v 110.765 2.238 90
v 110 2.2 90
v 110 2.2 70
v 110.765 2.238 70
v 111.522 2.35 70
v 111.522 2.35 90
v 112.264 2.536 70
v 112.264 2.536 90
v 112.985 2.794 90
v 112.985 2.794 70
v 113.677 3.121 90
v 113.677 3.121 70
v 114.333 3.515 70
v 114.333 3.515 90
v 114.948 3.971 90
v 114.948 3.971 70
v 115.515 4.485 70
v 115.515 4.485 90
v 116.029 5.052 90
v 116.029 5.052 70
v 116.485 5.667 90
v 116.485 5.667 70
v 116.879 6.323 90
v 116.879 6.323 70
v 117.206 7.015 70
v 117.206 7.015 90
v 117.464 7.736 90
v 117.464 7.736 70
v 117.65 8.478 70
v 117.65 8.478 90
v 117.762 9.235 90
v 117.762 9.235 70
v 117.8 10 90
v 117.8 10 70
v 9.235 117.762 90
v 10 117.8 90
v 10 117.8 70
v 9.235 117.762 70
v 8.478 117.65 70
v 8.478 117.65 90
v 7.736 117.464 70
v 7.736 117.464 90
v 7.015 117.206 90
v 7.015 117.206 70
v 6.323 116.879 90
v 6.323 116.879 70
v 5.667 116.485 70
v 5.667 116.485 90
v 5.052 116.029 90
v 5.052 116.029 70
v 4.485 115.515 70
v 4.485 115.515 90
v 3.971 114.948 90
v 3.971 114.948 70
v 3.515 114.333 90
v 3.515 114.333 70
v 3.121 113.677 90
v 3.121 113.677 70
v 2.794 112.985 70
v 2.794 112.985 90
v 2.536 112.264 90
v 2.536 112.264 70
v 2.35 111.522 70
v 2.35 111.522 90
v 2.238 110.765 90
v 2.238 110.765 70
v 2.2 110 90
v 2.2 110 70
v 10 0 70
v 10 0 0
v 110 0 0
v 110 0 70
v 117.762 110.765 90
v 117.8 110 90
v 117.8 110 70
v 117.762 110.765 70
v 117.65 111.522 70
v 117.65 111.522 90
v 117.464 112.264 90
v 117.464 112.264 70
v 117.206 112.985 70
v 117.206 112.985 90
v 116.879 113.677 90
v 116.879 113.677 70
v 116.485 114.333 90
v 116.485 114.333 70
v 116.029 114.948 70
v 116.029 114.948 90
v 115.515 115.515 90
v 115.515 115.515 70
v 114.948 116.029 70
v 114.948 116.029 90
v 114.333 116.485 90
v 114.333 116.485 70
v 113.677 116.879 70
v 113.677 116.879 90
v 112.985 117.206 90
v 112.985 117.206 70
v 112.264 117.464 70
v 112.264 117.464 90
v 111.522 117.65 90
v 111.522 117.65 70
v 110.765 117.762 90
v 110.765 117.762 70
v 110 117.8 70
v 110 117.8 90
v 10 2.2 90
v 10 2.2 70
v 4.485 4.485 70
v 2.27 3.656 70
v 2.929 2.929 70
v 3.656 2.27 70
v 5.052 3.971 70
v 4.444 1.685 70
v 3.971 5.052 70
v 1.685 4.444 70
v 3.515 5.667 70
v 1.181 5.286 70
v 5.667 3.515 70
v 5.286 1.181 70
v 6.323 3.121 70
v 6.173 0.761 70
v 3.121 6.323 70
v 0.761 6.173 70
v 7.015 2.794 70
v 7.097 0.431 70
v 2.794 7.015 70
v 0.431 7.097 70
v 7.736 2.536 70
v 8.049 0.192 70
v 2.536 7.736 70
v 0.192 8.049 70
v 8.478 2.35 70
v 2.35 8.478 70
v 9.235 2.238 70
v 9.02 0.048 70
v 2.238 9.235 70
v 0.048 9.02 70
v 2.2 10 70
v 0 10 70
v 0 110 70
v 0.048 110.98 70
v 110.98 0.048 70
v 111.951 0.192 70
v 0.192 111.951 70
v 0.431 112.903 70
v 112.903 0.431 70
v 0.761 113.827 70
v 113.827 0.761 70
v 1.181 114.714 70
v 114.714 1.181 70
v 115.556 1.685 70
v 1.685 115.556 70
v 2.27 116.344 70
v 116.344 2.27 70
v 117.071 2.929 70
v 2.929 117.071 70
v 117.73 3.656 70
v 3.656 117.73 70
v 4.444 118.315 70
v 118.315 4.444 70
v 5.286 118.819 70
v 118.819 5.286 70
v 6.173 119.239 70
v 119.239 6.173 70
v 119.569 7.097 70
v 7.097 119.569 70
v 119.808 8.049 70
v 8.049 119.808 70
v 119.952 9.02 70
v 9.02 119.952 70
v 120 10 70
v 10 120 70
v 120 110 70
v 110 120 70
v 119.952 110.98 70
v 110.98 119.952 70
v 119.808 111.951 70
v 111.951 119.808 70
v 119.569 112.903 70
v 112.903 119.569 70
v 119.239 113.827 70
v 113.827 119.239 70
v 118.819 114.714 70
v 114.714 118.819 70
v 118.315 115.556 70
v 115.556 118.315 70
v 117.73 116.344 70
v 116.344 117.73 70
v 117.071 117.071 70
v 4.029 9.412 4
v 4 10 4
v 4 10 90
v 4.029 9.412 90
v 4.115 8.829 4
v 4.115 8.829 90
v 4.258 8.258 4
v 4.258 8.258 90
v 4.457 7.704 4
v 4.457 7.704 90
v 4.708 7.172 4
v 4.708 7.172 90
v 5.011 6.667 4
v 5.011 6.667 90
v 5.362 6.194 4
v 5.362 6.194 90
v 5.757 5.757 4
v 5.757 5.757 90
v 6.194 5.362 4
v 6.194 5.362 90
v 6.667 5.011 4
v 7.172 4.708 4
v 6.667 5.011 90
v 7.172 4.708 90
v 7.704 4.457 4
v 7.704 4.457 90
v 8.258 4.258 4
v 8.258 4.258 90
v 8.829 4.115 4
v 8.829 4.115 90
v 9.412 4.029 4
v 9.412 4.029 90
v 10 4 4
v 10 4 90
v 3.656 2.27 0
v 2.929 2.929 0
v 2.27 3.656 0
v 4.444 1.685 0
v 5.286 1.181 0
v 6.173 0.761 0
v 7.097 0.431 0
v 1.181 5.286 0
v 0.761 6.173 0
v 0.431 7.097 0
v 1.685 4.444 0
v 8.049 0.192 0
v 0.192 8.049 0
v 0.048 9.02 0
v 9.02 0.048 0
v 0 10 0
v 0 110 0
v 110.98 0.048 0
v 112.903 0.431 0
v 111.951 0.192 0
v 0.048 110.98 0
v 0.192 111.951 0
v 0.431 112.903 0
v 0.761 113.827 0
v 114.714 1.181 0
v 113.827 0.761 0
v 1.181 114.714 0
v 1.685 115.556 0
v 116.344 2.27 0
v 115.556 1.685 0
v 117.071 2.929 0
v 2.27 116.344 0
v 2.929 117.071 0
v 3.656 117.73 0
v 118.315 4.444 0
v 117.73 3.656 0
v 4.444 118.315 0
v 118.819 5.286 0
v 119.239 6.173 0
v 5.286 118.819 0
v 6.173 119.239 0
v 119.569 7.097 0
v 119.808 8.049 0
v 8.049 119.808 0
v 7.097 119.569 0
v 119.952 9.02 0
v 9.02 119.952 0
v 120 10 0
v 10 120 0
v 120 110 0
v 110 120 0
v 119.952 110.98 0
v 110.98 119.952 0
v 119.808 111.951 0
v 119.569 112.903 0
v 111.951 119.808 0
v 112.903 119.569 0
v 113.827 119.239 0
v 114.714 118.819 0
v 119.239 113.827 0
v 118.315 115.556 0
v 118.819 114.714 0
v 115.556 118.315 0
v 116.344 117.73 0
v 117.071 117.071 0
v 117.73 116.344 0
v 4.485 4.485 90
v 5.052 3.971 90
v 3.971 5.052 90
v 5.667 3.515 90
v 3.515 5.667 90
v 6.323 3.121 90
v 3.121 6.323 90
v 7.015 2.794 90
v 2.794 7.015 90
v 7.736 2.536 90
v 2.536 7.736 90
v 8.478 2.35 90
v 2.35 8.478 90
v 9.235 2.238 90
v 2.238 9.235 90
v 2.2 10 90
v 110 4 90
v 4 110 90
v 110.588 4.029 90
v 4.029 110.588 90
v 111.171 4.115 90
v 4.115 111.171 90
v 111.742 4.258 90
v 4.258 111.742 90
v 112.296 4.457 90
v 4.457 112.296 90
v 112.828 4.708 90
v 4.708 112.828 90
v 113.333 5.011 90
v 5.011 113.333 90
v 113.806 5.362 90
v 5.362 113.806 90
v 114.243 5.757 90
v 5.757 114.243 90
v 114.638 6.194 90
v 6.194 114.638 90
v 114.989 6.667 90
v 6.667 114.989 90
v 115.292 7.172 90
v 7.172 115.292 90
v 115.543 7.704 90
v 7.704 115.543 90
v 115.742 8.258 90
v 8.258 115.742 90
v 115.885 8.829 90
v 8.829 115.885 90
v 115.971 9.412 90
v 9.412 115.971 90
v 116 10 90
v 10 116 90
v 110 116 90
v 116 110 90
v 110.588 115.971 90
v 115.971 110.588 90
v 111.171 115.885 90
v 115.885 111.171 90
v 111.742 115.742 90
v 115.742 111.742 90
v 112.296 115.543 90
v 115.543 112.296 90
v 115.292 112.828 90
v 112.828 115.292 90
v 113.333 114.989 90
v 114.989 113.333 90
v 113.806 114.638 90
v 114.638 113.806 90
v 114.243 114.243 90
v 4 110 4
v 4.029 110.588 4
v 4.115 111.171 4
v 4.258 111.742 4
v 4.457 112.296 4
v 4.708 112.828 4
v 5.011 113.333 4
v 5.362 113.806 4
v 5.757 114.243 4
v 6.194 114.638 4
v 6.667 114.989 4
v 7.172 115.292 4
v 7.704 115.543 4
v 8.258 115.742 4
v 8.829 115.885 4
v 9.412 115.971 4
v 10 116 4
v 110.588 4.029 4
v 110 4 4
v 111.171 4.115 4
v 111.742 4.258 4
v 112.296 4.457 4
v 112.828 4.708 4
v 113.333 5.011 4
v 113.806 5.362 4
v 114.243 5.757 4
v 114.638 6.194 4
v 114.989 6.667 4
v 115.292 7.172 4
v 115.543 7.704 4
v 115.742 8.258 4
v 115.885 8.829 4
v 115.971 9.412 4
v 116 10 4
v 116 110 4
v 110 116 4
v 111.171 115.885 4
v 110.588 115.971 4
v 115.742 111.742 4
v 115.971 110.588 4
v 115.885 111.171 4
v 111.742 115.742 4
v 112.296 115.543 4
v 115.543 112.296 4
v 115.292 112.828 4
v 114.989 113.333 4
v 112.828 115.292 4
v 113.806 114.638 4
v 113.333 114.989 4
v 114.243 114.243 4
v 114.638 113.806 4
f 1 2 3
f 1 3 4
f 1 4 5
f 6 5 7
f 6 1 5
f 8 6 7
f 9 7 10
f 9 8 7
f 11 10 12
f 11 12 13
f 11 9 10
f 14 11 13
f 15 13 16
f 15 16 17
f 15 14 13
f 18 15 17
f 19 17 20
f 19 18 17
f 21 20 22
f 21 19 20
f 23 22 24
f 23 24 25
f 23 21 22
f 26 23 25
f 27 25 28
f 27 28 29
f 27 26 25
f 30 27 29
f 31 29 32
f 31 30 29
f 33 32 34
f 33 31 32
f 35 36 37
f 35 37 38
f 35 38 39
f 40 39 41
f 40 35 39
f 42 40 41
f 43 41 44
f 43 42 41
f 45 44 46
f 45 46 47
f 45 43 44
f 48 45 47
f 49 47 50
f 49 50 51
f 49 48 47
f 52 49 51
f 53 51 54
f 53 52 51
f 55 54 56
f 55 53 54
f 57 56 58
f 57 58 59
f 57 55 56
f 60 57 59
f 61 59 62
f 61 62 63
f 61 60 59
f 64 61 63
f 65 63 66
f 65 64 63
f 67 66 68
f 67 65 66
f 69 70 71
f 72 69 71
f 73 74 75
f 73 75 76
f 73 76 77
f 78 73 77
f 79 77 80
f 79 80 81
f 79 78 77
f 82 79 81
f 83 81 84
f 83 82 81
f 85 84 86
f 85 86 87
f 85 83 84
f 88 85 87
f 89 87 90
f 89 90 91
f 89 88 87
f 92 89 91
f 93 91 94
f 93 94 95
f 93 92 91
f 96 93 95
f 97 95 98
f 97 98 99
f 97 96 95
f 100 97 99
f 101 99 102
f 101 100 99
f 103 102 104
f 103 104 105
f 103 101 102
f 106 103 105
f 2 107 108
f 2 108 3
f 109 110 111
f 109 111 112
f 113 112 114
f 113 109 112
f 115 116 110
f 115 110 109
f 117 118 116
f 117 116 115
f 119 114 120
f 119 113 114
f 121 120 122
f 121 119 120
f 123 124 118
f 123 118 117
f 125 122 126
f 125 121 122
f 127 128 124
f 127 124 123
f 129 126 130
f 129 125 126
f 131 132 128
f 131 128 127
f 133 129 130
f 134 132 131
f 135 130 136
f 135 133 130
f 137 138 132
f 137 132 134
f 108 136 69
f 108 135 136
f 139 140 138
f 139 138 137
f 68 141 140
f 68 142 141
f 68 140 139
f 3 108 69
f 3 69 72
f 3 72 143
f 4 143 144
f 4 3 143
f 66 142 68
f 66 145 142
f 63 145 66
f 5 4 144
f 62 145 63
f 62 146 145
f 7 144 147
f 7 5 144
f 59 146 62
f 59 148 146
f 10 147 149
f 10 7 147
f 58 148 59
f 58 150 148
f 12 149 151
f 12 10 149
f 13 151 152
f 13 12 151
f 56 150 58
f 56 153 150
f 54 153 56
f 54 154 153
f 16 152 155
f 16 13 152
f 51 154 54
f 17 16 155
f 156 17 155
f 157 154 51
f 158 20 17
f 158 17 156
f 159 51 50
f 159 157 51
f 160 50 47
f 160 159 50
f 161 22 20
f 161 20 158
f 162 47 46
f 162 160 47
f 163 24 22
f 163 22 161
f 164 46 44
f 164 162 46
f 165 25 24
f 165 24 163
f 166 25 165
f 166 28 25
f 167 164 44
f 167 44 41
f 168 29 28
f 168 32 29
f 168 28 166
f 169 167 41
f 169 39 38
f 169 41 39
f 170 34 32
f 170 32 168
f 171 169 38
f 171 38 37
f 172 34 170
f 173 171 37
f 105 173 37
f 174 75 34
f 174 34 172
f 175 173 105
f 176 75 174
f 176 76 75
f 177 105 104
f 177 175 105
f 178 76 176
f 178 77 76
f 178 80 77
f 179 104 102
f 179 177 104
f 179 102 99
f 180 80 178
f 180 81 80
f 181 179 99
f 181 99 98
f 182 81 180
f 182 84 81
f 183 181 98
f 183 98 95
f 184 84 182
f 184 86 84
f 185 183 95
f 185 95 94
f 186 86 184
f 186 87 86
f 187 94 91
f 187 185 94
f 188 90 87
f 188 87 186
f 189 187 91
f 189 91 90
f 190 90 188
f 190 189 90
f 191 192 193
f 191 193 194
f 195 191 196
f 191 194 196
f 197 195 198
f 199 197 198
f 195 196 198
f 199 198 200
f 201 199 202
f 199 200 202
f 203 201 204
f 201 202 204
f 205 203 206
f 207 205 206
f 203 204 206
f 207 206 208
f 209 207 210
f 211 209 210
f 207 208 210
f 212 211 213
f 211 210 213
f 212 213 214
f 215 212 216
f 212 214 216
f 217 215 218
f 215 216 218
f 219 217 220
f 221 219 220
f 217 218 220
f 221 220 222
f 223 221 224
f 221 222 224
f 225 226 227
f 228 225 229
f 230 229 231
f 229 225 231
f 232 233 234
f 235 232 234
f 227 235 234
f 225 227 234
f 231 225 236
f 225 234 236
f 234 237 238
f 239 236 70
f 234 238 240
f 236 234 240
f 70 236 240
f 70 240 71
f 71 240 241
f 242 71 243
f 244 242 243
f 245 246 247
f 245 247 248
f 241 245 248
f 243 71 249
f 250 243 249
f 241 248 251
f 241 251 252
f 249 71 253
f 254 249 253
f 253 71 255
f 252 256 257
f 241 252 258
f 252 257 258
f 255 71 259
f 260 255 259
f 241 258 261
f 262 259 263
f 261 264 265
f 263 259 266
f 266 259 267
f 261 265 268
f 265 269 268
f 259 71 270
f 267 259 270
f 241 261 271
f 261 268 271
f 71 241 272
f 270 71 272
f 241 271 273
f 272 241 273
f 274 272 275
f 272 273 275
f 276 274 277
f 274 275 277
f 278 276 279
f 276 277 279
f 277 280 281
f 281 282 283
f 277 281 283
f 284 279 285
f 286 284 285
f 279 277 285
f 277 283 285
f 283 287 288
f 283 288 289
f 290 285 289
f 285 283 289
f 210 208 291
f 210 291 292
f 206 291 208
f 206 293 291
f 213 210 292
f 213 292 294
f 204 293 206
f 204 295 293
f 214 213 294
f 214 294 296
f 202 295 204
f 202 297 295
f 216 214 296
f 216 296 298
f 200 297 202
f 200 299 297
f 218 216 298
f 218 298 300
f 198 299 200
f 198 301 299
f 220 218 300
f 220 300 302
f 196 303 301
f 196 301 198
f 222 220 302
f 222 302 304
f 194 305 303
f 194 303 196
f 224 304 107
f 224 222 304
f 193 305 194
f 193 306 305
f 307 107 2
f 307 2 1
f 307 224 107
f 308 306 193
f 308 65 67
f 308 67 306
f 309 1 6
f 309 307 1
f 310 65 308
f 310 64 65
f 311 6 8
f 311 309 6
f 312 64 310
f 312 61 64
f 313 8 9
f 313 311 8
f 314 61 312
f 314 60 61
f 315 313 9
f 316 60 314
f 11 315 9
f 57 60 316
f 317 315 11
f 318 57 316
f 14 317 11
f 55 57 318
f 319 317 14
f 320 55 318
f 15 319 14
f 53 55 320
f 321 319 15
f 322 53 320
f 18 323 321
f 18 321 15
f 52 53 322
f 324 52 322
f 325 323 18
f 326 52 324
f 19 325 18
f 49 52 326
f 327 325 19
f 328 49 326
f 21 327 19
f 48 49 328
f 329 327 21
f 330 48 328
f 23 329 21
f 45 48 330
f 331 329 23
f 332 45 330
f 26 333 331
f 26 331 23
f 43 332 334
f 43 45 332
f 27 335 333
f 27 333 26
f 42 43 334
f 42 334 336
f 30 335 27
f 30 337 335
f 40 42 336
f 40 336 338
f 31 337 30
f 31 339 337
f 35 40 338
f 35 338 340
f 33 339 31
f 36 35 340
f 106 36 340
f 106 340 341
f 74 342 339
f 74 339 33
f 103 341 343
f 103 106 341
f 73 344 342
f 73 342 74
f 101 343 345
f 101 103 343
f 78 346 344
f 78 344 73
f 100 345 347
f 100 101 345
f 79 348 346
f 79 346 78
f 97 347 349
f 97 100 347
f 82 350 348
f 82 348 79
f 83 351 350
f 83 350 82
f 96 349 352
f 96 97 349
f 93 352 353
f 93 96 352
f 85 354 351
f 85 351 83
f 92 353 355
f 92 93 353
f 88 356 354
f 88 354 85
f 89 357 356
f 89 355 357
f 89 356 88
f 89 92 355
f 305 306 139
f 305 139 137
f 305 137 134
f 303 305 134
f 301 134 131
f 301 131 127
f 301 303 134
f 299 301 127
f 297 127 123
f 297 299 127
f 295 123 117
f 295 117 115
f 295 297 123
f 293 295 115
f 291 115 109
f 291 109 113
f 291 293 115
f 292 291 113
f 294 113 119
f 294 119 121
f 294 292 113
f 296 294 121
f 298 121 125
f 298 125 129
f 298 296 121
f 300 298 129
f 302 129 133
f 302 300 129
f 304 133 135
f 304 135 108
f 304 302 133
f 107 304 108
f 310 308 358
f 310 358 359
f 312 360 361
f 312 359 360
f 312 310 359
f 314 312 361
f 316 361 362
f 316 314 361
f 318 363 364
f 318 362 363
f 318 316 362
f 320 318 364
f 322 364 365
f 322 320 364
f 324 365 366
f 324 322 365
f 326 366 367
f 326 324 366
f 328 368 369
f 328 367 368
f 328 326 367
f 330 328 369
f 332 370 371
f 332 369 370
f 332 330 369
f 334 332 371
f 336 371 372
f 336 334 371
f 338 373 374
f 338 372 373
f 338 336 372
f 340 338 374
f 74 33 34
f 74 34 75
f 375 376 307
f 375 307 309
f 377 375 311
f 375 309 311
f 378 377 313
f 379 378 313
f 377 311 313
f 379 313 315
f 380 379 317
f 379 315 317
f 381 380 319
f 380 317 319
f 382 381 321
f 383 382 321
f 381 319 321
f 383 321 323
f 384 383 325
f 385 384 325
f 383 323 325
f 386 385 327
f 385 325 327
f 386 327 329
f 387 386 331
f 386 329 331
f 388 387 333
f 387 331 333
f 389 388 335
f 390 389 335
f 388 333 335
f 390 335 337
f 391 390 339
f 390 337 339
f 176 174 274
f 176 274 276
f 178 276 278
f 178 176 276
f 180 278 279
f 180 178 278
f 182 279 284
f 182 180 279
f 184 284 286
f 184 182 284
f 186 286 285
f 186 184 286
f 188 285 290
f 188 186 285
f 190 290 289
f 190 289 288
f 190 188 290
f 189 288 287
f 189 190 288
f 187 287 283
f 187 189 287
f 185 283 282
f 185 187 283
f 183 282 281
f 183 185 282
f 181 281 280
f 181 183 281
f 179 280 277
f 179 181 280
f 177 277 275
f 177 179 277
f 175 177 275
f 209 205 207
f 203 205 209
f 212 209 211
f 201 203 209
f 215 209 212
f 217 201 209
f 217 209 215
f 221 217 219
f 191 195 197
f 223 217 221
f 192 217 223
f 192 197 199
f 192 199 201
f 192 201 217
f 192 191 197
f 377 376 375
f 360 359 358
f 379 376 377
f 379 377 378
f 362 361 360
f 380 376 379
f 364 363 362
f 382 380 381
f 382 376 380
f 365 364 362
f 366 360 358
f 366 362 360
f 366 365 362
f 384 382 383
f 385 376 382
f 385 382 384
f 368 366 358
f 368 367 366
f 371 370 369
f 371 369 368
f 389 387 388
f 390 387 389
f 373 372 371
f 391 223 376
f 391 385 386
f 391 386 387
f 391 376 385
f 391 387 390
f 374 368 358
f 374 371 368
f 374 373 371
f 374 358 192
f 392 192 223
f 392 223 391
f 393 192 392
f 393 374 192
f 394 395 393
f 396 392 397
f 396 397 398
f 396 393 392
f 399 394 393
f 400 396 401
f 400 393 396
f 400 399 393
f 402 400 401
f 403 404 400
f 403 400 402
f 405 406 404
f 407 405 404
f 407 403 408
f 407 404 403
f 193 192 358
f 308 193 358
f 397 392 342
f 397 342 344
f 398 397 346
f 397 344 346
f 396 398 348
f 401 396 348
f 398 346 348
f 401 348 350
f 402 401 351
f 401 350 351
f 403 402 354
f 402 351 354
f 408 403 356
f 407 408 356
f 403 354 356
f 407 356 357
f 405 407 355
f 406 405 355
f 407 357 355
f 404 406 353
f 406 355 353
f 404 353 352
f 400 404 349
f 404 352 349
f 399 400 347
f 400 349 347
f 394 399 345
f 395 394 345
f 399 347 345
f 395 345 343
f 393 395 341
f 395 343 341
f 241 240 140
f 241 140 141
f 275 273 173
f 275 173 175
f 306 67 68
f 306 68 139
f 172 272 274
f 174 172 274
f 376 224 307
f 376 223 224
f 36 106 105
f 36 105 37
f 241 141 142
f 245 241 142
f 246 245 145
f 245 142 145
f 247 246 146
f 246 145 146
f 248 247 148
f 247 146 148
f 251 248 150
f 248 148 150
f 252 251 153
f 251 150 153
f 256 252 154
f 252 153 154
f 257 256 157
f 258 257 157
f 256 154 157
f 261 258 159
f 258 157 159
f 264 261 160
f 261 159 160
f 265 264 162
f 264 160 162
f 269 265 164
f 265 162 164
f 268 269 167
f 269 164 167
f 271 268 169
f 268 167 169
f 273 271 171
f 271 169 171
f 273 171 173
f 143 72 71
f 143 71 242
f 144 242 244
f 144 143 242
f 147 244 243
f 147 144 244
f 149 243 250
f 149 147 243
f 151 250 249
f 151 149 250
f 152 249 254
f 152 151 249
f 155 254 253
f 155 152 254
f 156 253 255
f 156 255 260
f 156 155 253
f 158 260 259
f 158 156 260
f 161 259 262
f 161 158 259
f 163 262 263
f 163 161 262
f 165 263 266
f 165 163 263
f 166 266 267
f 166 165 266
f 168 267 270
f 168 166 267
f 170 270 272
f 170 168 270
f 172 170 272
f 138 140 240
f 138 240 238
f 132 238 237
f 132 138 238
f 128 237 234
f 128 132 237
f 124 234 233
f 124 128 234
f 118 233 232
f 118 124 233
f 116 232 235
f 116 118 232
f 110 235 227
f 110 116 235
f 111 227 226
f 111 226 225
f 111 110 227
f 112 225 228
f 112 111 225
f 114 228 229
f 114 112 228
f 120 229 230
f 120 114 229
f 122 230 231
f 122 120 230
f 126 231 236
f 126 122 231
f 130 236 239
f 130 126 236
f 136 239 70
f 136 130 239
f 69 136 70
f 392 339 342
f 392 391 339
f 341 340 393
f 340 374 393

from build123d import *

# Parameters (mm, degrees)
SKETCH2_W           = 120
SKETCH2_H           = 120
BOSS_EXTRUDE1_DEPTH = 90
FILLET1_R           = 10
SHELL1_T            = -4
CUT_EXTRUDE1_DEPTH  = 20


with BuildPart() as part:
    # Sketch2 → Boss-Extrude1 (new body)
    with BuildSketch(Plane.XY):
        with Locations((60, 60)):
            Rectangle(SKETCH2_W, SKETCH2_H)
    extrude(amount=BOSS_EXTRUDE1_DEPTH)

    # Fillet1
    fillet1_edges = [part.edges().sort_by_distance(p)[0] for p in [
        (0, 120, 45),
        (120, 120, 45),
        (120, 0, 45),
        (0, 0, 45),
    ]]
    fillet(fillet1_edges, radius=FILLET1_R)

    # Shell1
    shell1_openings = [part.faces().sort_by_distance(p)[0] for p in [
        (60, 60, 90),
    ]]
    offset(amount=SHELL1_T, openings=shell1_openings, kind=Kind.INTERSECTION)

    # Sketch4 → Cut-Extrude1 (cut)
    with BuildSketch(Plane.XY.offset(90)):
        with BuildLine():
            Line((0, 110), (0, 10))
            ThreePointArc((0, 10), (2.928932188, 2.928932188), (10, 0))
            Line((10, 0), (110, 0))
            ThreePointArc((110, 0), (117.071067812, 2.928932188), (120, 10))
            Line((120, 10), (120, 110))
            ThreePointArc((120, 110), (117.071067812, 117.071067812), (110, 120))
            Line((110, 120), (10, 120))
            ThreePointArc((10, 120), (2.928932188, 117.071067812), (0, 110))
        make_face()
        with BuildLine():
            Line((2.2, 110), (2.2, 10))
            ThreePointArc((2.2, 10), (4.484567107, 4.484567107), (10, 2.2))
            Line((10, 2.2), (110, 2.2))
            ThreePointArc((110, 2.2), (115.515432893, 4.484567107), (117.8, 10))
            Line((117.8, 10), (117.8, 110))
            ThreePointArc((117.8, 110), (115.515432893, 115.515432893), (110, 117.8))
            Line((110, 117.8), (10, 117.8))
            ThreePointArc((10, 117.8), (4.484567107, 115.515432893), (2.2, 110))
        make_face(mode=Mode.SUBTRACT)
    extrude(amount=-CUT_EXTRUDE1_DEPTH, mode=Mode.SUBTRACT)


solid = part.part
